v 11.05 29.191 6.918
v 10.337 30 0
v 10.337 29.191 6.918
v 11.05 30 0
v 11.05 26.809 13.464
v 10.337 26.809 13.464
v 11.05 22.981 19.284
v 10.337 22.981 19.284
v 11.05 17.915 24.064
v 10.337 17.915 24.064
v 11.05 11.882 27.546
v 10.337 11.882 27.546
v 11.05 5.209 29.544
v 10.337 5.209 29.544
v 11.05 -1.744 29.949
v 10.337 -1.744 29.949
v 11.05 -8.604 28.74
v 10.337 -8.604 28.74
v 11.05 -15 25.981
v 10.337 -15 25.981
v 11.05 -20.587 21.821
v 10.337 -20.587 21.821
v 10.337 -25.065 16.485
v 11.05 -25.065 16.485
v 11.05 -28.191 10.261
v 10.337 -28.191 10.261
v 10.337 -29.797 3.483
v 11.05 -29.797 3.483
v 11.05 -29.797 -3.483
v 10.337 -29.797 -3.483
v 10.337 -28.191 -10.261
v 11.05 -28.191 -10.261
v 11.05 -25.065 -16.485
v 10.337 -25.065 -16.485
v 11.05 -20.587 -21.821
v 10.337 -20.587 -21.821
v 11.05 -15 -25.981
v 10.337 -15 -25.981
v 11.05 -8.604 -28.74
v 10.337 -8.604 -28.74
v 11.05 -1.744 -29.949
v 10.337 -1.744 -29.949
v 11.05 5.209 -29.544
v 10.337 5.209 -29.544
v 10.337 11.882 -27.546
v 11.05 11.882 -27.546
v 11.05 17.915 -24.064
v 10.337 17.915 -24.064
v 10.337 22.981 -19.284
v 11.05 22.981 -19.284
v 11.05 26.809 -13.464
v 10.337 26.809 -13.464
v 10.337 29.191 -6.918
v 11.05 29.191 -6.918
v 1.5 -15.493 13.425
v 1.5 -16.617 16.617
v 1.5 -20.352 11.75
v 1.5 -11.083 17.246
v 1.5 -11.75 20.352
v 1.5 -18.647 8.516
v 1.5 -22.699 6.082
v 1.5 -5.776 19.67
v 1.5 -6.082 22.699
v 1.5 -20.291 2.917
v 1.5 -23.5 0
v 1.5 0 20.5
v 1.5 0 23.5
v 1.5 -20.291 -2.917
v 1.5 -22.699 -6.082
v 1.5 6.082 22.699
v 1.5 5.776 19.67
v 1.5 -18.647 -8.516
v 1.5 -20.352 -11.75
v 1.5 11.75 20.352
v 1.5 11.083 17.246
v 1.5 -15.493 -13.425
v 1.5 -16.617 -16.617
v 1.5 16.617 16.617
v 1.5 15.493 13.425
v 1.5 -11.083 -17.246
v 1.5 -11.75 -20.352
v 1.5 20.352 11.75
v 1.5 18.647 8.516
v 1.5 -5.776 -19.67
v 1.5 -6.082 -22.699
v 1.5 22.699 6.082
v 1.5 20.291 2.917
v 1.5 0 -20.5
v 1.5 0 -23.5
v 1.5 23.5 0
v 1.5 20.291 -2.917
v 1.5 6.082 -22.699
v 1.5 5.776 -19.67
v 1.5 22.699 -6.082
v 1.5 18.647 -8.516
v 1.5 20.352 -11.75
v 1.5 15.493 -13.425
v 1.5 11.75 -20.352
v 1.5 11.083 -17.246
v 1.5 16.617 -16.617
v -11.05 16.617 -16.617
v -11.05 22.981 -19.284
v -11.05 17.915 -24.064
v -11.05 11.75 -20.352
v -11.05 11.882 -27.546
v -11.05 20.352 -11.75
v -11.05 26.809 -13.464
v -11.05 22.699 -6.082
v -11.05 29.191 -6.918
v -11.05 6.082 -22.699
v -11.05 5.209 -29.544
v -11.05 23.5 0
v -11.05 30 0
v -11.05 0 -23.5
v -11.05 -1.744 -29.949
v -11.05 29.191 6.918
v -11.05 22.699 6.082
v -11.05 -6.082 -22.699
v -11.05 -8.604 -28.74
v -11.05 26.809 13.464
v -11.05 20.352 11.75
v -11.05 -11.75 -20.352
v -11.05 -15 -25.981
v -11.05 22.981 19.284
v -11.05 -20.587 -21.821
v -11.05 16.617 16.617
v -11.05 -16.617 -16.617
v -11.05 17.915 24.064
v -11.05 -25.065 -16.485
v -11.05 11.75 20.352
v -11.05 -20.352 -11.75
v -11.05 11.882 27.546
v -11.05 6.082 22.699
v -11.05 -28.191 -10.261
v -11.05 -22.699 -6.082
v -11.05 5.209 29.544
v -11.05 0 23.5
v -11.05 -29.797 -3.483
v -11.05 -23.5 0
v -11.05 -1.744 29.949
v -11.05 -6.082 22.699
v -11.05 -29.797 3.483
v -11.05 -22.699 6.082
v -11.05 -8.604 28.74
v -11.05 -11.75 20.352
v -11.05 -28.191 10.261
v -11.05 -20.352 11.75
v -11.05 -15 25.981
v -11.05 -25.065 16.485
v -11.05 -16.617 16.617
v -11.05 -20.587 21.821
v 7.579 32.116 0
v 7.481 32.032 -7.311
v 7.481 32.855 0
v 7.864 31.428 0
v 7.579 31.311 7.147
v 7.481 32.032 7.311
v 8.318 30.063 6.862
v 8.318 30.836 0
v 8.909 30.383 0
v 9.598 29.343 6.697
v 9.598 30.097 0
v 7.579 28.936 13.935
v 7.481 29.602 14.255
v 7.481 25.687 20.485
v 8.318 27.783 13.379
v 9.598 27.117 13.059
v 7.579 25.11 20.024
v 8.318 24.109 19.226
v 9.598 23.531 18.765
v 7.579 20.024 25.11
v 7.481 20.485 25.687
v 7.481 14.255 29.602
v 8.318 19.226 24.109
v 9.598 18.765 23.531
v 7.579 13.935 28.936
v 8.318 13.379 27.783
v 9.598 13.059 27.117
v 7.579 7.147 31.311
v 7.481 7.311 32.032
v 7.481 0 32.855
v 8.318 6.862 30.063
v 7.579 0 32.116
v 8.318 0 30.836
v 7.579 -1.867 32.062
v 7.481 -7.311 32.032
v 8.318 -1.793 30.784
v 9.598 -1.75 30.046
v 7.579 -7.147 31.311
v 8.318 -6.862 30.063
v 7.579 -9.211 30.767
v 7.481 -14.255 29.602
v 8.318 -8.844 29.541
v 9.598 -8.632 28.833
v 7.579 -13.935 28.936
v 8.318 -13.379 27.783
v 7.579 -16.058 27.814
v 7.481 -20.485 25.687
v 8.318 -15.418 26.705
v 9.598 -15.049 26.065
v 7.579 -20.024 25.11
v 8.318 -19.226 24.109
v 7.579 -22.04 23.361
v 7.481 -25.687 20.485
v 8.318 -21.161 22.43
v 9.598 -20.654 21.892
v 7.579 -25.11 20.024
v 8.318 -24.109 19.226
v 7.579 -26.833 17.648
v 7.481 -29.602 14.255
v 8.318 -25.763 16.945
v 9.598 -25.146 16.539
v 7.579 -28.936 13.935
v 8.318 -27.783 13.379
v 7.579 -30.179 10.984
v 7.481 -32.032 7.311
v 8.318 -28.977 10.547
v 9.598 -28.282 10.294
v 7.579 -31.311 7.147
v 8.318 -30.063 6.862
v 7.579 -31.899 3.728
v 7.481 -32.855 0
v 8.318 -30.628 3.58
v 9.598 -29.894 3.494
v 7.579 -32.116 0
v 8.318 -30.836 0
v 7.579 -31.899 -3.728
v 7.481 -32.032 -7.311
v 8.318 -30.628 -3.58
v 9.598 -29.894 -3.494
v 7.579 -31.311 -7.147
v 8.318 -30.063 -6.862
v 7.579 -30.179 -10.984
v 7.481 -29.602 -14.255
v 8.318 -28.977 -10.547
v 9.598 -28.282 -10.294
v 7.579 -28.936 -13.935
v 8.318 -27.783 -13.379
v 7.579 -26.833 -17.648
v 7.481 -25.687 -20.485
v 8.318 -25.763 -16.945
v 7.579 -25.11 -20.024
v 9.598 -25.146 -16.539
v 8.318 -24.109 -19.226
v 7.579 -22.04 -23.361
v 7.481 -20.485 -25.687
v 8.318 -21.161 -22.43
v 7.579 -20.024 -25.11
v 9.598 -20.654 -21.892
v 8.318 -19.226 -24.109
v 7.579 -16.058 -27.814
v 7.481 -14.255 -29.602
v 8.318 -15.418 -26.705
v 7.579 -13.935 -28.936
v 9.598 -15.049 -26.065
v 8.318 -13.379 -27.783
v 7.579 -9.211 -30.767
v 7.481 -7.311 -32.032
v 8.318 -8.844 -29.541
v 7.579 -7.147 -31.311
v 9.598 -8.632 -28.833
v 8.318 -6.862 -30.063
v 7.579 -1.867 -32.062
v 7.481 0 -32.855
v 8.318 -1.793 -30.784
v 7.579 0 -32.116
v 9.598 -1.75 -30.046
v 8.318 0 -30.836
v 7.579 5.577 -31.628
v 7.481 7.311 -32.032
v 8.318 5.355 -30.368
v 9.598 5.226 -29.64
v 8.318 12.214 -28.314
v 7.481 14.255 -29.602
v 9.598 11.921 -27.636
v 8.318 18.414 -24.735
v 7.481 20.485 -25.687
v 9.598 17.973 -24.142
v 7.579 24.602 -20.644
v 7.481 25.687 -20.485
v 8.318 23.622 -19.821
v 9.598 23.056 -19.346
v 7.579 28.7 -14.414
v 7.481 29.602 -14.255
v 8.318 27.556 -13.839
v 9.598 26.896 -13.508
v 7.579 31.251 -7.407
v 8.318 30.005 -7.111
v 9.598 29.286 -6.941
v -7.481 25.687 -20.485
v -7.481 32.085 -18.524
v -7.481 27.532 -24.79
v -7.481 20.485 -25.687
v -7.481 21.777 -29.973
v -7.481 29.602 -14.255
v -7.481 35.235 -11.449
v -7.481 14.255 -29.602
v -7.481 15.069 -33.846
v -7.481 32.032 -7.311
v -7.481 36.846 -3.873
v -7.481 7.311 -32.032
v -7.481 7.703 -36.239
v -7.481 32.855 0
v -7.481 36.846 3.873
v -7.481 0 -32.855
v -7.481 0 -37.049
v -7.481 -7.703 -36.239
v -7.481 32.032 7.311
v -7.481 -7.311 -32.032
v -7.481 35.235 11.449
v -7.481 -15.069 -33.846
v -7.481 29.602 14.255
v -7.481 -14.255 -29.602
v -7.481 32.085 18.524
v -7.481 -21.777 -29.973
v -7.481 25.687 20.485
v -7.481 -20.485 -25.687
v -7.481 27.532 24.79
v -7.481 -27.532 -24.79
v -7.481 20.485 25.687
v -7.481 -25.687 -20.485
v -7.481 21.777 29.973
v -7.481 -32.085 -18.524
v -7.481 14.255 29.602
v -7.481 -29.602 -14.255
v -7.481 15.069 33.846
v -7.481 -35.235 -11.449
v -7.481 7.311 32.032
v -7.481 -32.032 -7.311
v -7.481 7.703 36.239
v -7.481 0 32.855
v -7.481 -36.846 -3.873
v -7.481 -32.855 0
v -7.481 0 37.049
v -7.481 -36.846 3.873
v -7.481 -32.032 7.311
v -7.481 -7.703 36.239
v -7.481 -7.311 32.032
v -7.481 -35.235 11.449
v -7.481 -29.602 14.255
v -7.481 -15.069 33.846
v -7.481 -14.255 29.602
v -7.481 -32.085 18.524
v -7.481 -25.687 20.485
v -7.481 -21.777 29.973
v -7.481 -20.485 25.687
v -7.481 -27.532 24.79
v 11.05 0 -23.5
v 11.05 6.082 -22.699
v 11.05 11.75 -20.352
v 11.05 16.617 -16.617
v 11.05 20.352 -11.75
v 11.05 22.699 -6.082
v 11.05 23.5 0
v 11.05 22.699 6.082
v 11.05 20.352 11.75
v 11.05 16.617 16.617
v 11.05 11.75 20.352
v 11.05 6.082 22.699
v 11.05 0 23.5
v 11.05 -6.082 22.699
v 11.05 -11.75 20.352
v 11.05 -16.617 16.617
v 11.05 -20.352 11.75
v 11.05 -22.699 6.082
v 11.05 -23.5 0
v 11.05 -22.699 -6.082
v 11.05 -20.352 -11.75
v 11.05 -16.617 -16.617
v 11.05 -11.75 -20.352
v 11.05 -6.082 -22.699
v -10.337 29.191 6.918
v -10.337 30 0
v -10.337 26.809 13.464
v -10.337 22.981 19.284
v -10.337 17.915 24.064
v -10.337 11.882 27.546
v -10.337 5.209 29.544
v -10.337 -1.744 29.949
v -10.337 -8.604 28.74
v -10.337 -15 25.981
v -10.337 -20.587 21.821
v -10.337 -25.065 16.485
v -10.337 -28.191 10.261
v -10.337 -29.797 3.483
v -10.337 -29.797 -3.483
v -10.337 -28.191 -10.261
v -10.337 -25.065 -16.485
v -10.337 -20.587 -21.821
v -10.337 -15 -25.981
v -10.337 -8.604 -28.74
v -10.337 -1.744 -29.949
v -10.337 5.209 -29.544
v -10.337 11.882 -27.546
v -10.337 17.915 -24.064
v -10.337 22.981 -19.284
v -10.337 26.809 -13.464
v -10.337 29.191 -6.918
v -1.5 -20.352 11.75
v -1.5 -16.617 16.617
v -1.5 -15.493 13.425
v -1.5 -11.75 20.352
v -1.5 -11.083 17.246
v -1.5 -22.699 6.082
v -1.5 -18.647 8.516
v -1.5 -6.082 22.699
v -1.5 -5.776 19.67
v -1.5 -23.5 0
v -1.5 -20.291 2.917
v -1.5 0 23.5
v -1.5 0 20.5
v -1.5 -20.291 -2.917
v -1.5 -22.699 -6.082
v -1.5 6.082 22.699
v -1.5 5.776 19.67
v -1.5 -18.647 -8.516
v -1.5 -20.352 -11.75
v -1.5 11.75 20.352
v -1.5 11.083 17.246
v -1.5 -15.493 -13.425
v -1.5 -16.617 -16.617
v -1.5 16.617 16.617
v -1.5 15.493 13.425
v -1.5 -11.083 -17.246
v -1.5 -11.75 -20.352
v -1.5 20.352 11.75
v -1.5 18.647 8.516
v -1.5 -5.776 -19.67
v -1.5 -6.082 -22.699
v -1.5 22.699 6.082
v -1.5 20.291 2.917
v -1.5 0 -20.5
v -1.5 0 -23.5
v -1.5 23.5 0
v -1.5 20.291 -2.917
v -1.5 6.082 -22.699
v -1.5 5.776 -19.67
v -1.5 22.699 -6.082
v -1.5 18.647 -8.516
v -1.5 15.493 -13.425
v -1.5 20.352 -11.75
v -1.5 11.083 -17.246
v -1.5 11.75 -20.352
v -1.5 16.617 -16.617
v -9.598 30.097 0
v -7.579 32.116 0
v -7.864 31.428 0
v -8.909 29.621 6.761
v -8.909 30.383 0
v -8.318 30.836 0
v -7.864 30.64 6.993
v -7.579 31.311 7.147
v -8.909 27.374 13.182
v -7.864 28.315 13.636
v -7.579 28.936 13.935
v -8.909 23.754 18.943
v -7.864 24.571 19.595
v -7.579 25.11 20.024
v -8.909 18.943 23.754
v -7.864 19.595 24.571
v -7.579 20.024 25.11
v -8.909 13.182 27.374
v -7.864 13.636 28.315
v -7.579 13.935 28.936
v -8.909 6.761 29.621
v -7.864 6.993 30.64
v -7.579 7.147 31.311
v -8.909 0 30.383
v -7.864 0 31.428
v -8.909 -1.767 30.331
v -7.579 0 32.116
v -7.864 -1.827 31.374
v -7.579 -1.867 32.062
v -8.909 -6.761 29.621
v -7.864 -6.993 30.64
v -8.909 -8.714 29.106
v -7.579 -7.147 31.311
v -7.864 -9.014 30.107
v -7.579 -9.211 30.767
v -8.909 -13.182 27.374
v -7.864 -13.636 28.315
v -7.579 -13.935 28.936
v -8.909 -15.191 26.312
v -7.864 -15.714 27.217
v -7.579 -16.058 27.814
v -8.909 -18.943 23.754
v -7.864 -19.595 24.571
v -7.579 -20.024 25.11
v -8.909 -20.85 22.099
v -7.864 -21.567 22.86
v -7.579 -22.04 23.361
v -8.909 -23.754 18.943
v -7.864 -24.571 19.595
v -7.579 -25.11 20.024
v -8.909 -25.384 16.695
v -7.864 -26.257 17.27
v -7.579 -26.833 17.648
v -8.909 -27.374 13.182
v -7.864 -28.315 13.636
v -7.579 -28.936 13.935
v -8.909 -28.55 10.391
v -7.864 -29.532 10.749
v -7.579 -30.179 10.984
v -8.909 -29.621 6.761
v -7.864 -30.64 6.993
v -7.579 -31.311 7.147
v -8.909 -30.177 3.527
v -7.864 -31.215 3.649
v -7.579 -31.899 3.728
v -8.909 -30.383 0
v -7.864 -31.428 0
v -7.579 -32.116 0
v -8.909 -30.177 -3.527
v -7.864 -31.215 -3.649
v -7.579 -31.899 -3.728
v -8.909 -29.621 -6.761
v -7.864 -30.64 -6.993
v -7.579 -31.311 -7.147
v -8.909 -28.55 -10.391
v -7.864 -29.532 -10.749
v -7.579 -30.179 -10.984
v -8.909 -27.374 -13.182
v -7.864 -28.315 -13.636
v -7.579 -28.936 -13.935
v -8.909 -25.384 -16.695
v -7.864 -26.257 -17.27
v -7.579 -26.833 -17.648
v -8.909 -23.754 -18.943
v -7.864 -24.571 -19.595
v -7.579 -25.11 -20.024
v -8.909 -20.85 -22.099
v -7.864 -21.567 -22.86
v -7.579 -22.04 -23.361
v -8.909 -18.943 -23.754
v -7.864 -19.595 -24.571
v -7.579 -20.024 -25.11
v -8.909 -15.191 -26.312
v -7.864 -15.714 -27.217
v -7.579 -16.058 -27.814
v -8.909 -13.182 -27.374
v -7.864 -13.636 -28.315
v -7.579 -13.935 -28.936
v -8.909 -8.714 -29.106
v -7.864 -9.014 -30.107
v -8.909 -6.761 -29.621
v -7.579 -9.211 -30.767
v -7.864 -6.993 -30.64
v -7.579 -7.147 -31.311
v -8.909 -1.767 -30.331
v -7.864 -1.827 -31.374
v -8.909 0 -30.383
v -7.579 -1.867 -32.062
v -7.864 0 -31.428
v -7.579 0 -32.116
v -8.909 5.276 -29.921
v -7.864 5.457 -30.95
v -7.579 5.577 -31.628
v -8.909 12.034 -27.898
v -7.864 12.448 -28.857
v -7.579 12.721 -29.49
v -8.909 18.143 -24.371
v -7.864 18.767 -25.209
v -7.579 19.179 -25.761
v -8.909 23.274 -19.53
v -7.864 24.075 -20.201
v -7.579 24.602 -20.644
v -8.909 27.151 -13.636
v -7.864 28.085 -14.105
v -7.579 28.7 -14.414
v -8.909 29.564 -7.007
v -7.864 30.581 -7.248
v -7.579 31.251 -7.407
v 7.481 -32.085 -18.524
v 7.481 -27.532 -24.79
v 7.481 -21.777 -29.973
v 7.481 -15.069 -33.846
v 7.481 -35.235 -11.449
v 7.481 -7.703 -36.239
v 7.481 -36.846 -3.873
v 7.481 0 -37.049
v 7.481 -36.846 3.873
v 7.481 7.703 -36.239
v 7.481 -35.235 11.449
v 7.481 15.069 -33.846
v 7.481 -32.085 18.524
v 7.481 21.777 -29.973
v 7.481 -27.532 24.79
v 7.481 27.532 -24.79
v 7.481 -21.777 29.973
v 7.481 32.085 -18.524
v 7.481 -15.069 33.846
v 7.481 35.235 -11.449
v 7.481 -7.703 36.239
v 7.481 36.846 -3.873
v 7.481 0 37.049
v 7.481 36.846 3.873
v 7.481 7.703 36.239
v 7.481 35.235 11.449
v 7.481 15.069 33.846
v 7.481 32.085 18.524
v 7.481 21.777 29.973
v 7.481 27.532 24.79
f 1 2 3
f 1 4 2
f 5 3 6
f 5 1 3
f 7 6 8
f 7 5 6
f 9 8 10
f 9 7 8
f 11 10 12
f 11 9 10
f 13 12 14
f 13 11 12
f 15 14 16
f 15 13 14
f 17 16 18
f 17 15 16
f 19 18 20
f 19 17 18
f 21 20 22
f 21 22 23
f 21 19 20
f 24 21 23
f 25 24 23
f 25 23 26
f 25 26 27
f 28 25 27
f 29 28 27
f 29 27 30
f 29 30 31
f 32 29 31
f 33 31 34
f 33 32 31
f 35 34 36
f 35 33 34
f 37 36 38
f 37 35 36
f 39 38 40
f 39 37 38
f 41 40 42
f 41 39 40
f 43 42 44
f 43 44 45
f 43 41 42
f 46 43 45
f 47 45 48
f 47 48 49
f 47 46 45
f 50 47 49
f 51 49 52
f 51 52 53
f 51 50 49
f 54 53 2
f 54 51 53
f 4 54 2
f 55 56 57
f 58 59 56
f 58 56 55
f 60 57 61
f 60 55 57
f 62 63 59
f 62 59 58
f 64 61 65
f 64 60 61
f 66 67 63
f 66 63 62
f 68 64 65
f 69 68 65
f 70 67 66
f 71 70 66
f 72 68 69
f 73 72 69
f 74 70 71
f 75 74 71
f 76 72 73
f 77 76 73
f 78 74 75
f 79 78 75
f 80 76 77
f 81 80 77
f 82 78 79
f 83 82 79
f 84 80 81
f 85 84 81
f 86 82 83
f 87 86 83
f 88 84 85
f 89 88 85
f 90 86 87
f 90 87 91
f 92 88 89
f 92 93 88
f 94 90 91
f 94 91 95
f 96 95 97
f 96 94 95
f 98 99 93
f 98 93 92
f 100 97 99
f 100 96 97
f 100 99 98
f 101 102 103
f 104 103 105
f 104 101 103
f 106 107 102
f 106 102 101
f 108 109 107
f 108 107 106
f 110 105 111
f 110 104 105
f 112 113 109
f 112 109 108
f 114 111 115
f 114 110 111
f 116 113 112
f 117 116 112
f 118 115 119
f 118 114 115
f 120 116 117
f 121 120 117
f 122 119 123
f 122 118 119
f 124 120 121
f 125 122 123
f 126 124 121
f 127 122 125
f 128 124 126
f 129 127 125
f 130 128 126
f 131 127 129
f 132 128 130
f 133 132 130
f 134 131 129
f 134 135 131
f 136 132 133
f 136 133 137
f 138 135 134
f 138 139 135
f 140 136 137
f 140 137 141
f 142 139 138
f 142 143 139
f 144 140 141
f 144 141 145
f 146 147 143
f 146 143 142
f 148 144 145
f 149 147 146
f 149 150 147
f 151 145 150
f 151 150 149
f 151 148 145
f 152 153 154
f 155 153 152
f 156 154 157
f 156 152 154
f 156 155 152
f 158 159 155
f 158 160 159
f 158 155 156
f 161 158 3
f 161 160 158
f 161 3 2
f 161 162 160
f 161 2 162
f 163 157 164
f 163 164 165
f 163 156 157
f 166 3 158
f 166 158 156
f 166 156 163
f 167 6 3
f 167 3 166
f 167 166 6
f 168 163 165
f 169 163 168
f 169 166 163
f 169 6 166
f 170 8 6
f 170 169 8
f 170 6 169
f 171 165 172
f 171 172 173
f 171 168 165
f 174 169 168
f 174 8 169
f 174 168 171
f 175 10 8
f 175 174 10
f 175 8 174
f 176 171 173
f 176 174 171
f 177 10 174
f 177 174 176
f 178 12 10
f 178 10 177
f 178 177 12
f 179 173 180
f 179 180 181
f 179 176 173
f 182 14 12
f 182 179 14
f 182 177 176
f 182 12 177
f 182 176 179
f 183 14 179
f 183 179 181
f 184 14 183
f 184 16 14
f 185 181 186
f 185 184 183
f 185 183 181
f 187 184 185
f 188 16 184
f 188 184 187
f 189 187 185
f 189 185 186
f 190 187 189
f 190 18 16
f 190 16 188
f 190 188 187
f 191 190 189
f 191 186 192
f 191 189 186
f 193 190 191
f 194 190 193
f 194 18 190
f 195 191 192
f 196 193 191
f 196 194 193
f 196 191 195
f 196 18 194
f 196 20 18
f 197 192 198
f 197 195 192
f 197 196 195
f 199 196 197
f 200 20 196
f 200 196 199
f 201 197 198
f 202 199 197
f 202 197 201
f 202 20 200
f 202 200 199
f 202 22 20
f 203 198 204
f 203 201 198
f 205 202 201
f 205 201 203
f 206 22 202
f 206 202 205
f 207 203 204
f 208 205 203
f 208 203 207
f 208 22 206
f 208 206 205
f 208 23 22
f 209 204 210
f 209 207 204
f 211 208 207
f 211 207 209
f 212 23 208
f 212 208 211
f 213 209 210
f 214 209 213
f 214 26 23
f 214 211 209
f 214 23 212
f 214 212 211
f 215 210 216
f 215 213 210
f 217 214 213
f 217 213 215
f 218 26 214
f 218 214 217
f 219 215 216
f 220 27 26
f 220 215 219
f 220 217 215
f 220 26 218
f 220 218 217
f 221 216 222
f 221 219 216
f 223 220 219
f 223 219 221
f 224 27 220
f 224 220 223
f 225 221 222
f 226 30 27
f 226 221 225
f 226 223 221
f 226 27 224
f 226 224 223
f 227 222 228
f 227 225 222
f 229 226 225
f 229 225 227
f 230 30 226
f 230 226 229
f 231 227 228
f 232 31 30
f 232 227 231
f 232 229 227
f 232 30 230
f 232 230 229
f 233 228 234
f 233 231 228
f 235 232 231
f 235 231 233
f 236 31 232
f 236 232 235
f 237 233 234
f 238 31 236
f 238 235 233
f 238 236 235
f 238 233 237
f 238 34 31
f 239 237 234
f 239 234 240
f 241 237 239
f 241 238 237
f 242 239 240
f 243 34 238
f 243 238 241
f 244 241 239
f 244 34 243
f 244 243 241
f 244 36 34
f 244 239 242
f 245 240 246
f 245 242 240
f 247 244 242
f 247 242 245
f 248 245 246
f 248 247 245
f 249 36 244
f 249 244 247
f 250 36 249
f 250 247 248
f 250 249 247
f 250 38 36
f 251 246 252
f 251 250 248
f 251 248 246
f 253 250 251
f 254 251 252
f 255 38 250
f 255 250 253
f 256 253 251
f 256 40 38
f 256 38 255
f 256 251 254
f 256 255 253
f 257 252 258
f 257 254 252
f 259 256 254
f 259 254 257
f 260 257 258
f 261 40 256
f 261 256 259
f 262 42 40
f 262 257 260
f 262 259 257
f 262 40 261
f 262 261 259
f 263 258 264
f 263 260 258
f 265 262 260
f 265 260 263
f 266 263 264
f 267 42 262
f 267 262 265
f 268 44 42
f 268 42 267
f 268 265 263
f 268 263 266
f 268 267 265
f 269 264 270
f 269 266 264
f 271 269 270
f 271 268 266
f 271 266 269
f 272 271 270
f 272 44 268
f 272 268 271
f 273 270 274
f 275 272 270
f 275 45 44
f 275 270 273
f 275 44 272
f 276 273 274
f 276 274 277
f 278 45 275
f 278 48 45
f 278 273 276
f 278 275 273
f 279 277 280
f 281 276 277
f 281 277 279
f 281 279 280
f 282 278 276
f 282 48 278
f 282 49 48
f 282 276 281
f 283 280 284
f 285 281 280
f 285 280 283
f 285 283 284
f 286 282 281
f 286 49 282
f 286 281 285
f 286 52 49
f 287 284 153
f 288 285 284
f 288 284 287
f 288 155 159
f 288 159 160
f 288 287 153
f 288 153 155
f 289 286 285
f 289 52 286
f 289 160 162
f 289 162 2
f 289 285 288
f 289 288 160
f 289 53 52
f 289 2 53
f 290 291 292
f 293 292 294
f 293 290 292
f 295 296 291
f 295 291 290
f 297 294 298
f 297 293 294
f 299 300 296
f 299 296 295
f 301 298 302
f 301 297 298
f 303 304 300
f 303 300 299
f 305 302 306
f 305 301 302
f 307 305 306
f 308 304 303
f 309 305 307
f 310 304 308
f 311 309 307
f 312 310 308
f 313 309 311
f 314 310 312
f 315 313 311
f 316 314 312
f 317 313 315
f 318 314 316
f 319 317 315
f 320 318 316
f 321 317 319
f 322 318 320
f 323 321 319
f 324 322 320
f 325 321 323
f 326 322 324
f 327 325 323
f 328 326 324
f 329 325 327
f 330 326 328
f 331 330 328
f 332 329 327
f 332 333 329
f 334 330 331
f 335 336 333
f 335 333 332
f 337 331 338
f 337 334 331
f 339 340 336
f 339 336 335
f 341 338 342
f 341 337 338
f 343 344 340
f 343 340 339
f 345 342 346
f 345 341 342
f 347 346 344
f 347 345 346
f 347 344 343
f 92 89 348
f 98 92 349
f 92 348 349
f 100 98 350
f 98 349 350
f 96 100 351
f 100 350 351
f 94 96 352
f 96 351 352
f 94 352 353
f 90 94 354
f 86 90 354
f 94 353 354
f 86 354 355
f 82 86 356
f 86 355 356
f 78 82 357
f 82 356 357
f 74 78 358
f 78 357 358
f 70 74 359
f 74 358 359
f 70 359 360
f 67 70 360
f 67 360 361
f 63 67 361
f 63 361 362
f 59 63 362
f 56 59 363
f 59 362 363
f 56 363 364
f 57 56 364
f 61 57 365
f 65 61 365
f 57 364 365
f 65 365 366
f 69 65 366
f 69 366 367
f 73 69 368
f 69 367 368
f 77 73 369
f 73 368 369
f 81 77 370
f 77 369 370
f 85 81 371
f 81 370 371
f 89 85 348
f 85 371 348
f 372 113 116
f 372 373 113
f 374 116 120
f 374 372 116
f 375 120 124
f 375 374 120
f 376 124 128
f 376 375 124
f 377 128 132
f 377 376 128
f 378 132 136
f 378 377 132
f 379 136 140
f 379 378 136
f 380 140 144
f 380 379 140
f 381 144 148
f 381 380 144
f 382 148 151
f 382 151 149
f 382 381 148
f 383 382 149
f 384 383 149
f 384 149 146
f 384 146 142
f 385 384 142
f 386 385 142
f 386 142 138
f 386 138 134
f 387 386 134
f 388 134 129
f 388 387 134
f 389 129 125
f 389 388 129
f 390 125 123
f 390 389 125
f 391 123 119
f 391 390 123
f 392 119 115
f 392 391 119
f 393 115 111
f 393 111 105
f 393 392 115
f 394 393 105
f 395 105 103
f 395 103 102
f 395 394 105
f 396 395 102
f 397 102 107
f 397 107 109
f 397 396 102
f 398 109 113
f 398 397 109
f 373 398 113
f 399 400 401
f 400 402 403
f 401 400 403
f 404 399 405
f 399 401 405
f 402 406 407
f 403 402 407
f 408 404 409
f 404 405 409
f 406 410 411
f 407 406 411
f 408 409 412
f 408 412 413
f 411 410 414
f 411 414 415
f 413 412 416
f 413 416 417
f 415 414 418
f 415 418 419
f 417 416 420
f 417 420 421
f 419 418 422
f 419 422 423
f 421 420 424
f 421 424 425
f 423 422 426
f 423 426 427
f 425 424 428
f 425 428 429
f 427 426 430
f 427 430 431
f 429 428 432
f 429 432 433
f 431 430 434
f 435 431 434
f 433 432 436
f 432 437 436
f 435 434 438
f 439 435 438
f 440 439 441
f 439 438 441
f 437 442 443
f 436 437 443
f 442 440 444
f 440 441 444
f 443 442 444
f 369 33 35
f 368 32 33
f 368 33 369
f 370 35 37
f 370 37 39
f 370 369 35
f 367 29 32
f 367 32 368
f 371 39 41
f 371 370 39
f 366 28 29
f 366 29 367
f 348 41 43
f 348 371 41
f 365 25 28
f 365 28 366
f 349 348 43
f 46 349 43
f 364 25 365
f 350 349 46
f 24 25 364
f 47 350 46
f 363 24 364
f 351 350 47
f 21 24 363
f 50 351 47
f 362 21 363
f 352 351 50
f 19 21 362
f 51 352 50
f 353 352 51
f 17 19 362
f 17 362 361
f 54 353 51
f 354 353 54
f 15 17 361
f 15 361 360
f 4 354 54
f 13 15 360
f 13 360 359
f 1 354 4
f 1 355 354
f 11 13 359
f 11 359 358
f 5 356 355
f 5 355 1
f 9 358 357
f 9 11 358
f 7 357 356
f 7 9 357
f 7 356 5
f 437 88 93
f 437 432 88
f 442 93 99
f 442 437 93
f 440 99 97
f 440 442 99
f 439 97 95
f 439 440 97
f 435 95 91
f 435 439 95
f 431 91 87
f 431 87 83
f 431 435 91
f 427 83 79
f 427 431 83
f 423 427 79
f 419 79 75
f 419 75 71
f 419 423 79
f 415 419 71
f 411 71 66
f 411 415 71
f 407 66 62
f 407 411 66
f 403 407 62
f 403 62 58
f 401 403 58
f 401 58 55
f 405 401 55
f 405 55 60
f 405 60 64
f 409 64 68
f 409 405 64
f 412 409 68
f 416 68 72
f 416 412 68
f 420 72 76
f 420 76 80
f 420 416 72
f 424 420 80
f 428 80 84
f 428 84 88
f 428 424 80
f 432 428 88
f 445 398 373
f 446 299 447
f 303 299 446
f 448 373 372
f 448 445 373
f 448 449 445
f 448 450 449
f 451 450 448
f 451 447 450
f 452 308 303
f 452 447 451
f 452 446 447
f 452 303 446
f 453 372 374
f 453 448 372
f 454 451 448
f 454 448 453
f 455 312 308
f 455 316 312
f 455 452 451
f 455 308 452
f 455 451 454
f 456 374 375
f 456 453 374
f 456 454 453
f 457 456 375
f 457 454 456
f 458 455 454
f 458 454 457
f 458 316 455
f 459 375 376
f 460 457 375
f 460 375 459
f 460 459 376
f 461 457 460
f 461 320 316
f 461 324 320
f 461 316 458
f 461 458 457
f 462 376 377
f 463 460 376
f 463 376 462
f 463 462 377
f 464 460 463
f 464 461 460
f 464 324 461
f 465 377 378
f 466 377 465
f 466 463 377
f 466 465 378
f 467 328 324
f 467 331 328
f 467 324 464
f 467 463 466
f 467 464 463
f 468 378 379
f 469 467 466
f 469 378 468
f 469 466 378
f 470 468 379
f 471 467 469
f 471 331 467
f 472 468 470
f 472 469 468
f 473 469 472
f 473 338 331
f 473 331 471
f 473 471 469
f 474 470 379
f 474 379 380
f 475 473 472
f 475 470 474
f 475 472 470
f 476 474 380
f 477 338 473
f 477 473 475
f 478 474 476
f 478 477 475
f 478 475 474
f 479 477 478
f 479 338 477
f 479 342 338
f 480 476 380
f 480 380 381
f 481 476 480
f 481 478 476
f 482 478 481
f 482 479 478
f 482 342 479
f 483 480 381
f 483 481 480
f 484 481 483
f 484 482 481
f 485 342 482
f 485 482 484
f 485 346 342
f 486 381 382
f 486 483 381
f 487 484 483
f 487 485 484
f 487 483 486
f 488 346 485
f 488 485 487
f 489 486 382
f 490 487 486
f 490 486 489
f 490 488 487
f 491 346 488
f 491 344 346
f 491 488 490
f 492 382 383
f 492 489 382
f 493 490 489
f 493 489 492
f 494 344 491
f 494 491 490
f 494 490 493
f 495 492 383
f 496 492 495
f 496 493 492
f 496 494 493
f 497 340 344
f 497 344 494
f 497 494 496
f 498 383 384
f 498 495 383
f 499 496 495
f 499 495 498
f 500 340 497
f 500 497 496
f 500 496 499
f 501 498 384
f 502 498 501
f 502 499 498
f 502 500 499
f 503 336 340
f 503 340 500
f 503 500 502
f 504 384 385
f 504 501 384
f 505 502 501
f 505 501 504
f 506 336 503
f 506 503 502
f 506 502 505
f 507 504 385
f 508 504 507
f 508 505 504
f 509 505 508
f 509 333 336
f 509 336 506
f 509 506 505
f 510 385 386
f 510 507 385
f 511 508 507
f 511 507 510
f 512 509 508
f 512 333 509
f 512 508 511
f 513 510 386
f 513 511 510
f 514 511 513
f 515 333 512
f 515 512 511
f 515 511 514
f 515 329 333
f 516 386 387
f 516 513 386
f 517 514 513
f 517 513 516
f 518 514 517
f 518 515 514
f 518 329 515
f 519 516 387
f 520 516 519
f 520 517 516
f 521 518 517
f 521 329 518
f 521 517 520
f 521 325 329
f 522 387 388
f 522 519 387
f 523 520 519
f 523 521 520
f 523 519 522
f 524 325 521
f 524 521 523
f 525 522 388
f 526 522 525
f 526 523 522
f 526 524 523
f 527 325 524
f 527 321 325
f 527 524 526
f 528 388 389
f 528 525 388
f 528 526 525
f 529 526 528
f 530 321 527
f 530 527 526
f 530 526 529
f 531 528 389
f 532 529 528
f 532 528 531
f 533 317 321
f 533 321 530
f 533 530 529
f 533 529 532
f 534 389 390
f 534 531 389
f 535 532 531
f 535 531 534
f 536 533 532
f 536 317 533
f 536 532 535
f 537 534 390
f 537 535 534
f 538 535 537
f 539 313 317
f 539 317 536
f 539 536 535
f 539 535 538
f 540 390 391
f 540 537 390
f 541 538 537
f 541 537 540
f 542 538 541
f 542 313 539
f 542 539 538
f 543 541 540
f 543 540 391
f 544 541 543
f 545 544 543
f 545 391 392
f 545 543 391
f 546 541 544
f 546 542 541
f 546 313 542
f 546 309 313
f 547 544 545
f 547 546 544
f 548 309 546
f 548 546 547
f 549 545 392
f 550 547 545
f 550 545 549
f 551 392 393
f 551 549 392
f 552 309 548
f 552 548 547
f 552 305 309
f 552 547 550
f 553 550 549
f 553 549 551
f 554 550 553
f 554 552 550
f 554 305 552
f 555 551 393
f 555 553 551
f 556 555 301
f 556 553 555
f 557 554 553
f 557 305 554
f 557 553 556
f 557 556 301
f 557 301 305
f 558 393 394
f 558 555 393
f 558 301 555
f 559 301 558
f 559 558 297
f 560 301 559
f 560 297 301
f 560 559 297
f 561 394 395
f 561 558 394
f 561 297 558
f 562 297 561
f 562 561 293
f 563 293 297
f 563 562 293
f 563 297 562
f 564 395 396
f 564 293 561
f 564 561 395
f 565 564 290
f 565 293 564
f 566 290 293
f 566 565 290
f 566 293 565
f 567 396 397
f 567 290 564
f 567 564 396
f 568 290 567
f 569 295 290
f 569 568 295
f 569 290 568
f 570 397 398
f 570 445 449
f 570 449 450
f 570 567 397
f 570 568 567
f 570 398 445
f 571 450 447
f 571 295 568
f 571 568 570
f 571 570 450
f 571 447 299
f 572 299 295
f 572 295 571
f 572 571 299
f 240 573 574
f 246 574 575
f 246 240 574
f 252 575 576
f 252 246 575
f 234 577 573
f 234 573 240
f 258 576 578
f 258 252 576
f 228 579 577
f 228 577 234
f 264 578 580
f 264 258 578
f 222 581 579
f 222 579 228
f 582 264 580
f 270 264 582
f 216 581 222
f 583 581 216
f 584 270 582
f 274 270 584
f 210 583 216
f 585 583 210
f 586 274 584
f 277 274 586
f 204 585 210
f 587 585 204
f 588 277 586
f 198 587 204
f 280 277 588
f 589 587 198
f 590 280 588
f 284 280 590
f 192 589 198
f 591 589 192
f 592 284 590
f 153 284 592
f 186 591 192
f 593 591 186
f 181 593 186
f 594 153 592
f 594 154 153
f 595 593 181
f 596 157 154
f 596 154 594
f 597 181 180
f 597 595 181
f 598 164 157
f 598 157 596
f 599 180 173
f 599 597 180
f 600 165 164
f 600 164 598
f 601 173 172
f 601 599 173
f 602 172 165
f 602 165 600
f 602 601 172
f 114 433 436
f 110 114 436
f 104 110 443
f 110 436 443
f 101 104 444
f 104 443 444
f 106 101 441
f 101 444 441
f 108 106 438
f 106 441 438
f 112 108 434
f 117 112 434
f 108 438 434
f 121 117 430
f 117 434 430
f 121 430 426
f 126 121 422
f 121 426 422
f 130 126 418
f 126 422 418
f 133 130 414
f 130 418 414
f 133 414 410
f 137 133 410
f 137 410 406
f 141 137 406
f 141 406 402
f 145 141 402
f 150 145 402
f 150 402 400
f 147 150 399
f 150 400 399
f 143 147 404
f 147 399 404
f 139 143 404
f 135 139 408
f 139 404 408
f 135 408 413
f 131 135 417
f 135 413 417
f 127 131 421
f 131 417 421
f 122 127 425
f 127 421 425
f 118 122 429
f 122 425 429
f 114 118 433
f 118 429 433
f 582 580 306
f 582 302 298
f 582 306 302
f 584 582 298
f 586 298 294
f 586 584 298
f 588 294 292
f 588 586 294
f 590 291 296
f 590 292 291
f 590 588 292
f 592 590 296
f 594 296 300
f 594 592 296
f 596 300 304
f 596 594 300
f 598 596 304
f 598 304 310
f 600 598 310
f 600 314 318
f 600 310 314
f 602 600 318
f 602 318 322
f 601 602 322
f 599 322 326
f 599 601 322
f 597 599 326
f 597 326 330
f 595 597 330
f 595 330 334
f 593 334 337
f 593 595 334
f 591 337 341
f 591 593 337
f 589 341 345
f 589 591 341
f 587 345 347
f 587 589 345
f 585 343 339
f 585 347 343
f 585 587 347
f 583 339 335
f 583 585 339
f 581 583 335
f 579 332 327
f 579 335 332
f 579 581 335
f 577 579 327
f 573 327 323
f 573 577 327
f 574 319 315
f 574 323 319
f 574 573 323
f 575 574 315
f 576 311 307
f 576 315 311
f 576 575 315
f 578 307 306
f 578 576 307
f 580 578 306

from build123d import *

# Parameters (mm, degrees)
EXTRUDECUTONE_DEPTH     = 10.800356134
PATTERNONE_COUNT        = 11
CUT_EXTRUDEA_DEPTH      = 72.376396027
CUT_EXTRUDEA_DEPTH_BACK = 72.376396027
SKETCHHOLE_R            = 23.5
SKETCH_3_OUTSIDE_W      = 129.786
SKETCH_3_OUTSIDE_H      = 128.809
SKETCH_3_OUTSIDE_R      = 37.048512268
CUT_EXTRUDE_4_DEPTH     = 74.898044777
SKETCH_4_R              = 23.5
SKETCH_4_R_2            = 20.5
EXTRUDE_1_DEPTH         = 1.5


with BuildPart() as part:
    # Sketch1 → Revolve 2 (revolve)
    with BuildSketch(Plane.XY):
        with BuildLine():
            Line((-11.050356134, 0), (-11.050356134, 30))
            Line((-11.050356134, 30), (-10.336534907, 30))
            ThreePointArc((-10.336534907, 30), (-8.317543587, 30.836293587), (-7.48125, 32.855284907))
            Line((-7.48125, 32.855284907), (-7.48125, 37.138212268))
            ThreePointArc((-7.48125, 37.138212268), (-6.685622836, 43.788705552), (-4.17925, 50))
            Line((-4.17925, 50), (4.17925, 50))
            ThreePointArc((4.17925, 50), (6.685622836, 43.788705552), (7.48125, 37.138212268))
            Line((7.48125, 37.138212268), (7.48125, 32.855284907))
            ThreePointArc((7.48125, 32.855284907), (8.317543587, 30.836293587), (10.336534907, 30))
            Line((10.336534907, 30), (11.050356134, 30))
            Line((11.050356134, 30), (11.050356134, 0))
            Line((11.050356134, 0), (-11.050356134, 0))
        make_face()
    revolve(axis=Axis((-4, 0, 0), (1, 0, 0)))

    # Sketch2 → ExtrudeCutOne (cut, symmetric)
    with BuildSketch(Plane(origin=(0, 0, 0), x_dir=(0, 0, -1), z_dir=(1, 0, 0))):
        with BuildLine():
            Line((8.716675765, 43.732789559), (9.255531143, 44.765919154))
            ThreePointArc((9.255531143, 44.765919154), (10.574511832, 46.771349182), (12.269067769, 48.471331487))
            ThreePointArc((12.269067769, 48.471331487), (0, 50), (-12.269067769, 48.471331487))
            ThreePointArc((-12.269067769, 48.471331487), (-10.574511832, 46.771349182), (-9.255531143, 44.765919154))
            Line((-9.255531143, 44.765919154), (-8.716675765, 43.732789559))
            ThreePointArc((-8.716675765, 43.732789559), (-7.522276521, 41.726996037), (-6.109966983, 39.868184863))
            ThreePointArc((-6.109966983, 39.868184863), (0, 37.048512268), (6.109966983, 39.868184863))
            ThreePointArc((6.109966983, 39.868184863), (7.522276521, 41.726996037), (8.716675765, 43.732789559))
        make_face()
    extrudecutone = extrude(amount=EXTRUDECUTONE_DEPTH, both=True, mode=Mode.SUBTRACT)

    # PatternOne: ExtrudeCutOne ×11 about axis
    patternone_axis = Axis((-4, 0, 0), (1, 0, 0))
    for i in range(1, PATTERNONE_COUNT):
        add(extrudecutone.rotate(patternone_axis, i * 360 / PATTERNONE_COUNT), mode=Mode.SUBTRACT)

    # SketchHole → Cut-ExtrudeA (cut, two sides: drawn at the far end of the back side and taken through both)
    with BuildSketch(Plane(origin=(0, 0, 0), x_dir=(0, 0, -1), z_dir=(1, 0, 0)).offset(-CUT_EXTRUDEA_DEPTH_BACK)):
        Circle(SKETCHHOLE_R)
    extrude(amount=CUT_EXTRUDEA_DEPTH + CUT_EXTRUDEA_DEPTH_BACK, mode=Mode.SUBTRACT)

    # 草图3 outside → 切除-拉伸4 (cut, through all)
    with BuildSketch(Plane(origin=(11.050356134, 0, 0), x_dir=(0, 0, -1), z_dir=(1, 0, 0))):
        with Locations((0, -0.7645)):
            Rectangle(SKETCH_3_OUTSIDE_W, SKETCH_3_OUTSIDE_H)
        Circle(SKETCH_3_OUTSIDE_R, mode=Mode.SUBTRACT)
    extrude(amount=-CUT_EXTRUDE_4_DEPTH, mode=Mode.SUBTRACT)

    # 草图4 → 凸台-拉伸1 (add, symmetric)
    with BuildSketch(Plane(origin=(0, 0, 0), x_dir=(0, 0, -1), z_dir=(1, 0, 0))):
        Circle(SKETCH_4_R)
        Circle(SKETCH_4_R_2, mode=Mode.SUBTRACT)
    extrude(amount=EXTRUDE_1_DEPTH, both=True)


solid = part.part
